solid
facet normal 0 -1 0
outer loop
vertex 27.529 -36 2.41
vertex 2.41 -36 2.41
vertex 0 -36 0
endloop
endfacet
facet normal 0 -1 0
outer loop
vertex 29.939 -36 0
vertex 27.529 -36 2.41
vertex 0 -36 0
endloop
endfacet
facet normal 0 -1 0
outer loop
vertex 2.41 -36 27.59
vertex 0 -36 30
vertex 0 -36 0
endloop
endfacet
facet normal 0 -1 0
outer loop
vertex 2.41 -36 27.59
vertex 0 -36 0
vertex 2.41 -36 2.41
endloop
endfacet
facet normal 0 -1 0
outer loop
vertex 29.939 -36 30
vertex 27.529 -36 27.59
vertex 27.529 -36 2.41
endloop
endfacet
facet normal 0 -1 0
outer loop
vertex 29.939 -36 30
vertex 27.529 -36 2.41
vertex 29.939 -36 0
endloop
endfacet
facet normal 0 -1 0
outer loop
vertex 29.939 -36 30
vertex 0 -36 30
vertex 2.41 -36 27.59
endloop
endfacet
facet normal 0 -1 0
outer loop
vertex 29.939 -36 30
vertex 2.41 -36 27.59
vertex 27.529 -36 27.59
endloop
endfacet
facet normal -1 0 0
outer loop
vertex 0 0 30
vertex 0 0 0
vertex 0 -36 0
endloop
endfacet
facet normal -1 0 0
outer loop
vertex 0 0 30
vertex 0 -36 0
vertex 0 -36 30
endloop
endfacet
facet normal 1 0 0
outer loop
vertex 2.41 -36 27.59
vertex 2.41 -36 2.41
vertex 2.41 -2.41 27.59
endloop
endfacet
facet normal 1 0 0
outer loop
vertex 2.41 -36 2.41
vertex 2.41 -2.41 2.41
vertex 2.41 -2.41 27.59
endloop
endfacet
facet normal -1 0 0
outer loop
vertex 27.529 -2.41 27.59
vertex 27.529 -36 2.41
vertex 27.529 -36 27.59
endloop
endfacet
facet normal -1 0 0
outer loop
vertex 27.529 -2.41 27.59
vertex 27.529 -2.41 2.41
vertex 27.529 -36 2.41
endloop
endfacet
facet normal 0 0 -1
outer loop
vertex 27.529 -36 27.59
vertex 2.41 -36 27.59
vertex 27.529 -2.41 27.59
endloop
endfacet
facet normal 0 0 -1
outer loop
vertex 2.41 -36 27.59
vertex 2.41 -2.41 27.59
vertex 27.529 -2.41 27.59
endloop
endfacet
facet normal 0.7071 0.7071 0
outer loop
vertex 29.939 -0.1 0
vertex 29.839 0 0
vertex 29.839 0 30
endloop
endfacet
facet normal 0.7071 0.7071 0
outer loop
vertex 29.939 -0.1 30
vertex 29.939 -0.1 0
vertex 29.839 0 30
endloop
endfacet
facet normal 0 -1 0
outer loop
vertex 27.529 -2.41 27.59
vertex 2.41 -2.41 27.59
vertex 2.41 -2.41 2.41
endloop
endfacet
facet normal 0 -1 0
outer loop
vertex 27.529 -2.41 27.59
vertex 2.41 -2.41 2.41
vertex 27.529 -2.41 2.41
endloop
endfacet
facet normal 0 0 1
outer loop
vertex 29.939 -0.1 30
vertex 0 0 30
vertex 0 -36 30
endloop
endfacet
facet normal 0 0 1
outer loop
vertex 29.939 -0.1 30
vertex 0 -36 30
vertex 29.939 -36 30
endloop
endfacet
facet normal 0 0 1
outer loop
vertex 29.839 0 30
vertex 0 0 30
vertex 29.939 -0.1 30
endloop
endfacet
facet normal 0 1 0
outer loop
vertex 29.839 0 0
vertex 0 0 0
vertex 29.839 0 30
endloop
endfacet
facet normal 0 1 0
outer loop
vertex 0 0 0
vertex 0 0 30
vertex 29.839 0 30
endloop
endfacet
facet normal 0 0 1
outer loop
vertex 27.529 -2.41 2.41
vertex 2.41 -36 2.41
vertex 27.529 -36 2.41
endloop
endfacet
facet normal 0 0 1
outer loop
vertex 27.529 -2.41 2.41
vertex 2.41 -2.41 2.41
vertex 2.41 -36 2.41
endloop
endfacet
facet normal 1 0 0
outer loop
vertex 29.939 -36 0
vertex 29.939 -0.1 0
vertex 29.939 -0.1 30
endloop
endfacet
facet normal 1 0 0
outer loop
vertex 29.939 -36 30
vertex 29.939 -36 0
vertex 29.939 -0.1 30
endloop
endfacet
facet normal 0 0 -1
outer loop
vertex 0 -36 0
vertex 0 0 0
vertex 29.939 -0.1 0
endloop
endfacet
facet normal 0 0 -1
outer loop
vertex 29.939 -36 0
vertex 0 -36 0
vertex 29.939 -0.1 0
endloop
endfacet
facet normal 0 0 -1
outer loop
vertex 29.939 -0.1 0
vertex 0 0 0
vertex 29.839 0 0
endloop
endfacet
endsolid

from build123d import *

# Parameters (mm, degrees)
F0_W     = 29.938724
F0_H     = 30
F1_DEPTH = 36
F2_T     = -2.41
F3_SIZE  = 0.1


with BuildPart() as f1:
    # F0 (on Front) → F1 (new body)
    with BuildSketch(Plane.XZ):
        with Locations((14.969362, 15)):
            Rectangle(F0_W, F0_H)
    extrude(amount=F1_DEPTH)

    # F2
    f2_openings = [f1.faces().sort_by_distance(p)[0] for p in [
        (14.969362, -36, 15),
    ]]
    offset(amount=F2_T, openings=f2_openings)

    # F3
    f3_edges = [f1.edges().sort_by_distance(p)[0] for p in [
        (29.938724, 0, 15),
    ]]
    chamfer(f3_edges, length=F3_SIZE)


solid = f1.part
